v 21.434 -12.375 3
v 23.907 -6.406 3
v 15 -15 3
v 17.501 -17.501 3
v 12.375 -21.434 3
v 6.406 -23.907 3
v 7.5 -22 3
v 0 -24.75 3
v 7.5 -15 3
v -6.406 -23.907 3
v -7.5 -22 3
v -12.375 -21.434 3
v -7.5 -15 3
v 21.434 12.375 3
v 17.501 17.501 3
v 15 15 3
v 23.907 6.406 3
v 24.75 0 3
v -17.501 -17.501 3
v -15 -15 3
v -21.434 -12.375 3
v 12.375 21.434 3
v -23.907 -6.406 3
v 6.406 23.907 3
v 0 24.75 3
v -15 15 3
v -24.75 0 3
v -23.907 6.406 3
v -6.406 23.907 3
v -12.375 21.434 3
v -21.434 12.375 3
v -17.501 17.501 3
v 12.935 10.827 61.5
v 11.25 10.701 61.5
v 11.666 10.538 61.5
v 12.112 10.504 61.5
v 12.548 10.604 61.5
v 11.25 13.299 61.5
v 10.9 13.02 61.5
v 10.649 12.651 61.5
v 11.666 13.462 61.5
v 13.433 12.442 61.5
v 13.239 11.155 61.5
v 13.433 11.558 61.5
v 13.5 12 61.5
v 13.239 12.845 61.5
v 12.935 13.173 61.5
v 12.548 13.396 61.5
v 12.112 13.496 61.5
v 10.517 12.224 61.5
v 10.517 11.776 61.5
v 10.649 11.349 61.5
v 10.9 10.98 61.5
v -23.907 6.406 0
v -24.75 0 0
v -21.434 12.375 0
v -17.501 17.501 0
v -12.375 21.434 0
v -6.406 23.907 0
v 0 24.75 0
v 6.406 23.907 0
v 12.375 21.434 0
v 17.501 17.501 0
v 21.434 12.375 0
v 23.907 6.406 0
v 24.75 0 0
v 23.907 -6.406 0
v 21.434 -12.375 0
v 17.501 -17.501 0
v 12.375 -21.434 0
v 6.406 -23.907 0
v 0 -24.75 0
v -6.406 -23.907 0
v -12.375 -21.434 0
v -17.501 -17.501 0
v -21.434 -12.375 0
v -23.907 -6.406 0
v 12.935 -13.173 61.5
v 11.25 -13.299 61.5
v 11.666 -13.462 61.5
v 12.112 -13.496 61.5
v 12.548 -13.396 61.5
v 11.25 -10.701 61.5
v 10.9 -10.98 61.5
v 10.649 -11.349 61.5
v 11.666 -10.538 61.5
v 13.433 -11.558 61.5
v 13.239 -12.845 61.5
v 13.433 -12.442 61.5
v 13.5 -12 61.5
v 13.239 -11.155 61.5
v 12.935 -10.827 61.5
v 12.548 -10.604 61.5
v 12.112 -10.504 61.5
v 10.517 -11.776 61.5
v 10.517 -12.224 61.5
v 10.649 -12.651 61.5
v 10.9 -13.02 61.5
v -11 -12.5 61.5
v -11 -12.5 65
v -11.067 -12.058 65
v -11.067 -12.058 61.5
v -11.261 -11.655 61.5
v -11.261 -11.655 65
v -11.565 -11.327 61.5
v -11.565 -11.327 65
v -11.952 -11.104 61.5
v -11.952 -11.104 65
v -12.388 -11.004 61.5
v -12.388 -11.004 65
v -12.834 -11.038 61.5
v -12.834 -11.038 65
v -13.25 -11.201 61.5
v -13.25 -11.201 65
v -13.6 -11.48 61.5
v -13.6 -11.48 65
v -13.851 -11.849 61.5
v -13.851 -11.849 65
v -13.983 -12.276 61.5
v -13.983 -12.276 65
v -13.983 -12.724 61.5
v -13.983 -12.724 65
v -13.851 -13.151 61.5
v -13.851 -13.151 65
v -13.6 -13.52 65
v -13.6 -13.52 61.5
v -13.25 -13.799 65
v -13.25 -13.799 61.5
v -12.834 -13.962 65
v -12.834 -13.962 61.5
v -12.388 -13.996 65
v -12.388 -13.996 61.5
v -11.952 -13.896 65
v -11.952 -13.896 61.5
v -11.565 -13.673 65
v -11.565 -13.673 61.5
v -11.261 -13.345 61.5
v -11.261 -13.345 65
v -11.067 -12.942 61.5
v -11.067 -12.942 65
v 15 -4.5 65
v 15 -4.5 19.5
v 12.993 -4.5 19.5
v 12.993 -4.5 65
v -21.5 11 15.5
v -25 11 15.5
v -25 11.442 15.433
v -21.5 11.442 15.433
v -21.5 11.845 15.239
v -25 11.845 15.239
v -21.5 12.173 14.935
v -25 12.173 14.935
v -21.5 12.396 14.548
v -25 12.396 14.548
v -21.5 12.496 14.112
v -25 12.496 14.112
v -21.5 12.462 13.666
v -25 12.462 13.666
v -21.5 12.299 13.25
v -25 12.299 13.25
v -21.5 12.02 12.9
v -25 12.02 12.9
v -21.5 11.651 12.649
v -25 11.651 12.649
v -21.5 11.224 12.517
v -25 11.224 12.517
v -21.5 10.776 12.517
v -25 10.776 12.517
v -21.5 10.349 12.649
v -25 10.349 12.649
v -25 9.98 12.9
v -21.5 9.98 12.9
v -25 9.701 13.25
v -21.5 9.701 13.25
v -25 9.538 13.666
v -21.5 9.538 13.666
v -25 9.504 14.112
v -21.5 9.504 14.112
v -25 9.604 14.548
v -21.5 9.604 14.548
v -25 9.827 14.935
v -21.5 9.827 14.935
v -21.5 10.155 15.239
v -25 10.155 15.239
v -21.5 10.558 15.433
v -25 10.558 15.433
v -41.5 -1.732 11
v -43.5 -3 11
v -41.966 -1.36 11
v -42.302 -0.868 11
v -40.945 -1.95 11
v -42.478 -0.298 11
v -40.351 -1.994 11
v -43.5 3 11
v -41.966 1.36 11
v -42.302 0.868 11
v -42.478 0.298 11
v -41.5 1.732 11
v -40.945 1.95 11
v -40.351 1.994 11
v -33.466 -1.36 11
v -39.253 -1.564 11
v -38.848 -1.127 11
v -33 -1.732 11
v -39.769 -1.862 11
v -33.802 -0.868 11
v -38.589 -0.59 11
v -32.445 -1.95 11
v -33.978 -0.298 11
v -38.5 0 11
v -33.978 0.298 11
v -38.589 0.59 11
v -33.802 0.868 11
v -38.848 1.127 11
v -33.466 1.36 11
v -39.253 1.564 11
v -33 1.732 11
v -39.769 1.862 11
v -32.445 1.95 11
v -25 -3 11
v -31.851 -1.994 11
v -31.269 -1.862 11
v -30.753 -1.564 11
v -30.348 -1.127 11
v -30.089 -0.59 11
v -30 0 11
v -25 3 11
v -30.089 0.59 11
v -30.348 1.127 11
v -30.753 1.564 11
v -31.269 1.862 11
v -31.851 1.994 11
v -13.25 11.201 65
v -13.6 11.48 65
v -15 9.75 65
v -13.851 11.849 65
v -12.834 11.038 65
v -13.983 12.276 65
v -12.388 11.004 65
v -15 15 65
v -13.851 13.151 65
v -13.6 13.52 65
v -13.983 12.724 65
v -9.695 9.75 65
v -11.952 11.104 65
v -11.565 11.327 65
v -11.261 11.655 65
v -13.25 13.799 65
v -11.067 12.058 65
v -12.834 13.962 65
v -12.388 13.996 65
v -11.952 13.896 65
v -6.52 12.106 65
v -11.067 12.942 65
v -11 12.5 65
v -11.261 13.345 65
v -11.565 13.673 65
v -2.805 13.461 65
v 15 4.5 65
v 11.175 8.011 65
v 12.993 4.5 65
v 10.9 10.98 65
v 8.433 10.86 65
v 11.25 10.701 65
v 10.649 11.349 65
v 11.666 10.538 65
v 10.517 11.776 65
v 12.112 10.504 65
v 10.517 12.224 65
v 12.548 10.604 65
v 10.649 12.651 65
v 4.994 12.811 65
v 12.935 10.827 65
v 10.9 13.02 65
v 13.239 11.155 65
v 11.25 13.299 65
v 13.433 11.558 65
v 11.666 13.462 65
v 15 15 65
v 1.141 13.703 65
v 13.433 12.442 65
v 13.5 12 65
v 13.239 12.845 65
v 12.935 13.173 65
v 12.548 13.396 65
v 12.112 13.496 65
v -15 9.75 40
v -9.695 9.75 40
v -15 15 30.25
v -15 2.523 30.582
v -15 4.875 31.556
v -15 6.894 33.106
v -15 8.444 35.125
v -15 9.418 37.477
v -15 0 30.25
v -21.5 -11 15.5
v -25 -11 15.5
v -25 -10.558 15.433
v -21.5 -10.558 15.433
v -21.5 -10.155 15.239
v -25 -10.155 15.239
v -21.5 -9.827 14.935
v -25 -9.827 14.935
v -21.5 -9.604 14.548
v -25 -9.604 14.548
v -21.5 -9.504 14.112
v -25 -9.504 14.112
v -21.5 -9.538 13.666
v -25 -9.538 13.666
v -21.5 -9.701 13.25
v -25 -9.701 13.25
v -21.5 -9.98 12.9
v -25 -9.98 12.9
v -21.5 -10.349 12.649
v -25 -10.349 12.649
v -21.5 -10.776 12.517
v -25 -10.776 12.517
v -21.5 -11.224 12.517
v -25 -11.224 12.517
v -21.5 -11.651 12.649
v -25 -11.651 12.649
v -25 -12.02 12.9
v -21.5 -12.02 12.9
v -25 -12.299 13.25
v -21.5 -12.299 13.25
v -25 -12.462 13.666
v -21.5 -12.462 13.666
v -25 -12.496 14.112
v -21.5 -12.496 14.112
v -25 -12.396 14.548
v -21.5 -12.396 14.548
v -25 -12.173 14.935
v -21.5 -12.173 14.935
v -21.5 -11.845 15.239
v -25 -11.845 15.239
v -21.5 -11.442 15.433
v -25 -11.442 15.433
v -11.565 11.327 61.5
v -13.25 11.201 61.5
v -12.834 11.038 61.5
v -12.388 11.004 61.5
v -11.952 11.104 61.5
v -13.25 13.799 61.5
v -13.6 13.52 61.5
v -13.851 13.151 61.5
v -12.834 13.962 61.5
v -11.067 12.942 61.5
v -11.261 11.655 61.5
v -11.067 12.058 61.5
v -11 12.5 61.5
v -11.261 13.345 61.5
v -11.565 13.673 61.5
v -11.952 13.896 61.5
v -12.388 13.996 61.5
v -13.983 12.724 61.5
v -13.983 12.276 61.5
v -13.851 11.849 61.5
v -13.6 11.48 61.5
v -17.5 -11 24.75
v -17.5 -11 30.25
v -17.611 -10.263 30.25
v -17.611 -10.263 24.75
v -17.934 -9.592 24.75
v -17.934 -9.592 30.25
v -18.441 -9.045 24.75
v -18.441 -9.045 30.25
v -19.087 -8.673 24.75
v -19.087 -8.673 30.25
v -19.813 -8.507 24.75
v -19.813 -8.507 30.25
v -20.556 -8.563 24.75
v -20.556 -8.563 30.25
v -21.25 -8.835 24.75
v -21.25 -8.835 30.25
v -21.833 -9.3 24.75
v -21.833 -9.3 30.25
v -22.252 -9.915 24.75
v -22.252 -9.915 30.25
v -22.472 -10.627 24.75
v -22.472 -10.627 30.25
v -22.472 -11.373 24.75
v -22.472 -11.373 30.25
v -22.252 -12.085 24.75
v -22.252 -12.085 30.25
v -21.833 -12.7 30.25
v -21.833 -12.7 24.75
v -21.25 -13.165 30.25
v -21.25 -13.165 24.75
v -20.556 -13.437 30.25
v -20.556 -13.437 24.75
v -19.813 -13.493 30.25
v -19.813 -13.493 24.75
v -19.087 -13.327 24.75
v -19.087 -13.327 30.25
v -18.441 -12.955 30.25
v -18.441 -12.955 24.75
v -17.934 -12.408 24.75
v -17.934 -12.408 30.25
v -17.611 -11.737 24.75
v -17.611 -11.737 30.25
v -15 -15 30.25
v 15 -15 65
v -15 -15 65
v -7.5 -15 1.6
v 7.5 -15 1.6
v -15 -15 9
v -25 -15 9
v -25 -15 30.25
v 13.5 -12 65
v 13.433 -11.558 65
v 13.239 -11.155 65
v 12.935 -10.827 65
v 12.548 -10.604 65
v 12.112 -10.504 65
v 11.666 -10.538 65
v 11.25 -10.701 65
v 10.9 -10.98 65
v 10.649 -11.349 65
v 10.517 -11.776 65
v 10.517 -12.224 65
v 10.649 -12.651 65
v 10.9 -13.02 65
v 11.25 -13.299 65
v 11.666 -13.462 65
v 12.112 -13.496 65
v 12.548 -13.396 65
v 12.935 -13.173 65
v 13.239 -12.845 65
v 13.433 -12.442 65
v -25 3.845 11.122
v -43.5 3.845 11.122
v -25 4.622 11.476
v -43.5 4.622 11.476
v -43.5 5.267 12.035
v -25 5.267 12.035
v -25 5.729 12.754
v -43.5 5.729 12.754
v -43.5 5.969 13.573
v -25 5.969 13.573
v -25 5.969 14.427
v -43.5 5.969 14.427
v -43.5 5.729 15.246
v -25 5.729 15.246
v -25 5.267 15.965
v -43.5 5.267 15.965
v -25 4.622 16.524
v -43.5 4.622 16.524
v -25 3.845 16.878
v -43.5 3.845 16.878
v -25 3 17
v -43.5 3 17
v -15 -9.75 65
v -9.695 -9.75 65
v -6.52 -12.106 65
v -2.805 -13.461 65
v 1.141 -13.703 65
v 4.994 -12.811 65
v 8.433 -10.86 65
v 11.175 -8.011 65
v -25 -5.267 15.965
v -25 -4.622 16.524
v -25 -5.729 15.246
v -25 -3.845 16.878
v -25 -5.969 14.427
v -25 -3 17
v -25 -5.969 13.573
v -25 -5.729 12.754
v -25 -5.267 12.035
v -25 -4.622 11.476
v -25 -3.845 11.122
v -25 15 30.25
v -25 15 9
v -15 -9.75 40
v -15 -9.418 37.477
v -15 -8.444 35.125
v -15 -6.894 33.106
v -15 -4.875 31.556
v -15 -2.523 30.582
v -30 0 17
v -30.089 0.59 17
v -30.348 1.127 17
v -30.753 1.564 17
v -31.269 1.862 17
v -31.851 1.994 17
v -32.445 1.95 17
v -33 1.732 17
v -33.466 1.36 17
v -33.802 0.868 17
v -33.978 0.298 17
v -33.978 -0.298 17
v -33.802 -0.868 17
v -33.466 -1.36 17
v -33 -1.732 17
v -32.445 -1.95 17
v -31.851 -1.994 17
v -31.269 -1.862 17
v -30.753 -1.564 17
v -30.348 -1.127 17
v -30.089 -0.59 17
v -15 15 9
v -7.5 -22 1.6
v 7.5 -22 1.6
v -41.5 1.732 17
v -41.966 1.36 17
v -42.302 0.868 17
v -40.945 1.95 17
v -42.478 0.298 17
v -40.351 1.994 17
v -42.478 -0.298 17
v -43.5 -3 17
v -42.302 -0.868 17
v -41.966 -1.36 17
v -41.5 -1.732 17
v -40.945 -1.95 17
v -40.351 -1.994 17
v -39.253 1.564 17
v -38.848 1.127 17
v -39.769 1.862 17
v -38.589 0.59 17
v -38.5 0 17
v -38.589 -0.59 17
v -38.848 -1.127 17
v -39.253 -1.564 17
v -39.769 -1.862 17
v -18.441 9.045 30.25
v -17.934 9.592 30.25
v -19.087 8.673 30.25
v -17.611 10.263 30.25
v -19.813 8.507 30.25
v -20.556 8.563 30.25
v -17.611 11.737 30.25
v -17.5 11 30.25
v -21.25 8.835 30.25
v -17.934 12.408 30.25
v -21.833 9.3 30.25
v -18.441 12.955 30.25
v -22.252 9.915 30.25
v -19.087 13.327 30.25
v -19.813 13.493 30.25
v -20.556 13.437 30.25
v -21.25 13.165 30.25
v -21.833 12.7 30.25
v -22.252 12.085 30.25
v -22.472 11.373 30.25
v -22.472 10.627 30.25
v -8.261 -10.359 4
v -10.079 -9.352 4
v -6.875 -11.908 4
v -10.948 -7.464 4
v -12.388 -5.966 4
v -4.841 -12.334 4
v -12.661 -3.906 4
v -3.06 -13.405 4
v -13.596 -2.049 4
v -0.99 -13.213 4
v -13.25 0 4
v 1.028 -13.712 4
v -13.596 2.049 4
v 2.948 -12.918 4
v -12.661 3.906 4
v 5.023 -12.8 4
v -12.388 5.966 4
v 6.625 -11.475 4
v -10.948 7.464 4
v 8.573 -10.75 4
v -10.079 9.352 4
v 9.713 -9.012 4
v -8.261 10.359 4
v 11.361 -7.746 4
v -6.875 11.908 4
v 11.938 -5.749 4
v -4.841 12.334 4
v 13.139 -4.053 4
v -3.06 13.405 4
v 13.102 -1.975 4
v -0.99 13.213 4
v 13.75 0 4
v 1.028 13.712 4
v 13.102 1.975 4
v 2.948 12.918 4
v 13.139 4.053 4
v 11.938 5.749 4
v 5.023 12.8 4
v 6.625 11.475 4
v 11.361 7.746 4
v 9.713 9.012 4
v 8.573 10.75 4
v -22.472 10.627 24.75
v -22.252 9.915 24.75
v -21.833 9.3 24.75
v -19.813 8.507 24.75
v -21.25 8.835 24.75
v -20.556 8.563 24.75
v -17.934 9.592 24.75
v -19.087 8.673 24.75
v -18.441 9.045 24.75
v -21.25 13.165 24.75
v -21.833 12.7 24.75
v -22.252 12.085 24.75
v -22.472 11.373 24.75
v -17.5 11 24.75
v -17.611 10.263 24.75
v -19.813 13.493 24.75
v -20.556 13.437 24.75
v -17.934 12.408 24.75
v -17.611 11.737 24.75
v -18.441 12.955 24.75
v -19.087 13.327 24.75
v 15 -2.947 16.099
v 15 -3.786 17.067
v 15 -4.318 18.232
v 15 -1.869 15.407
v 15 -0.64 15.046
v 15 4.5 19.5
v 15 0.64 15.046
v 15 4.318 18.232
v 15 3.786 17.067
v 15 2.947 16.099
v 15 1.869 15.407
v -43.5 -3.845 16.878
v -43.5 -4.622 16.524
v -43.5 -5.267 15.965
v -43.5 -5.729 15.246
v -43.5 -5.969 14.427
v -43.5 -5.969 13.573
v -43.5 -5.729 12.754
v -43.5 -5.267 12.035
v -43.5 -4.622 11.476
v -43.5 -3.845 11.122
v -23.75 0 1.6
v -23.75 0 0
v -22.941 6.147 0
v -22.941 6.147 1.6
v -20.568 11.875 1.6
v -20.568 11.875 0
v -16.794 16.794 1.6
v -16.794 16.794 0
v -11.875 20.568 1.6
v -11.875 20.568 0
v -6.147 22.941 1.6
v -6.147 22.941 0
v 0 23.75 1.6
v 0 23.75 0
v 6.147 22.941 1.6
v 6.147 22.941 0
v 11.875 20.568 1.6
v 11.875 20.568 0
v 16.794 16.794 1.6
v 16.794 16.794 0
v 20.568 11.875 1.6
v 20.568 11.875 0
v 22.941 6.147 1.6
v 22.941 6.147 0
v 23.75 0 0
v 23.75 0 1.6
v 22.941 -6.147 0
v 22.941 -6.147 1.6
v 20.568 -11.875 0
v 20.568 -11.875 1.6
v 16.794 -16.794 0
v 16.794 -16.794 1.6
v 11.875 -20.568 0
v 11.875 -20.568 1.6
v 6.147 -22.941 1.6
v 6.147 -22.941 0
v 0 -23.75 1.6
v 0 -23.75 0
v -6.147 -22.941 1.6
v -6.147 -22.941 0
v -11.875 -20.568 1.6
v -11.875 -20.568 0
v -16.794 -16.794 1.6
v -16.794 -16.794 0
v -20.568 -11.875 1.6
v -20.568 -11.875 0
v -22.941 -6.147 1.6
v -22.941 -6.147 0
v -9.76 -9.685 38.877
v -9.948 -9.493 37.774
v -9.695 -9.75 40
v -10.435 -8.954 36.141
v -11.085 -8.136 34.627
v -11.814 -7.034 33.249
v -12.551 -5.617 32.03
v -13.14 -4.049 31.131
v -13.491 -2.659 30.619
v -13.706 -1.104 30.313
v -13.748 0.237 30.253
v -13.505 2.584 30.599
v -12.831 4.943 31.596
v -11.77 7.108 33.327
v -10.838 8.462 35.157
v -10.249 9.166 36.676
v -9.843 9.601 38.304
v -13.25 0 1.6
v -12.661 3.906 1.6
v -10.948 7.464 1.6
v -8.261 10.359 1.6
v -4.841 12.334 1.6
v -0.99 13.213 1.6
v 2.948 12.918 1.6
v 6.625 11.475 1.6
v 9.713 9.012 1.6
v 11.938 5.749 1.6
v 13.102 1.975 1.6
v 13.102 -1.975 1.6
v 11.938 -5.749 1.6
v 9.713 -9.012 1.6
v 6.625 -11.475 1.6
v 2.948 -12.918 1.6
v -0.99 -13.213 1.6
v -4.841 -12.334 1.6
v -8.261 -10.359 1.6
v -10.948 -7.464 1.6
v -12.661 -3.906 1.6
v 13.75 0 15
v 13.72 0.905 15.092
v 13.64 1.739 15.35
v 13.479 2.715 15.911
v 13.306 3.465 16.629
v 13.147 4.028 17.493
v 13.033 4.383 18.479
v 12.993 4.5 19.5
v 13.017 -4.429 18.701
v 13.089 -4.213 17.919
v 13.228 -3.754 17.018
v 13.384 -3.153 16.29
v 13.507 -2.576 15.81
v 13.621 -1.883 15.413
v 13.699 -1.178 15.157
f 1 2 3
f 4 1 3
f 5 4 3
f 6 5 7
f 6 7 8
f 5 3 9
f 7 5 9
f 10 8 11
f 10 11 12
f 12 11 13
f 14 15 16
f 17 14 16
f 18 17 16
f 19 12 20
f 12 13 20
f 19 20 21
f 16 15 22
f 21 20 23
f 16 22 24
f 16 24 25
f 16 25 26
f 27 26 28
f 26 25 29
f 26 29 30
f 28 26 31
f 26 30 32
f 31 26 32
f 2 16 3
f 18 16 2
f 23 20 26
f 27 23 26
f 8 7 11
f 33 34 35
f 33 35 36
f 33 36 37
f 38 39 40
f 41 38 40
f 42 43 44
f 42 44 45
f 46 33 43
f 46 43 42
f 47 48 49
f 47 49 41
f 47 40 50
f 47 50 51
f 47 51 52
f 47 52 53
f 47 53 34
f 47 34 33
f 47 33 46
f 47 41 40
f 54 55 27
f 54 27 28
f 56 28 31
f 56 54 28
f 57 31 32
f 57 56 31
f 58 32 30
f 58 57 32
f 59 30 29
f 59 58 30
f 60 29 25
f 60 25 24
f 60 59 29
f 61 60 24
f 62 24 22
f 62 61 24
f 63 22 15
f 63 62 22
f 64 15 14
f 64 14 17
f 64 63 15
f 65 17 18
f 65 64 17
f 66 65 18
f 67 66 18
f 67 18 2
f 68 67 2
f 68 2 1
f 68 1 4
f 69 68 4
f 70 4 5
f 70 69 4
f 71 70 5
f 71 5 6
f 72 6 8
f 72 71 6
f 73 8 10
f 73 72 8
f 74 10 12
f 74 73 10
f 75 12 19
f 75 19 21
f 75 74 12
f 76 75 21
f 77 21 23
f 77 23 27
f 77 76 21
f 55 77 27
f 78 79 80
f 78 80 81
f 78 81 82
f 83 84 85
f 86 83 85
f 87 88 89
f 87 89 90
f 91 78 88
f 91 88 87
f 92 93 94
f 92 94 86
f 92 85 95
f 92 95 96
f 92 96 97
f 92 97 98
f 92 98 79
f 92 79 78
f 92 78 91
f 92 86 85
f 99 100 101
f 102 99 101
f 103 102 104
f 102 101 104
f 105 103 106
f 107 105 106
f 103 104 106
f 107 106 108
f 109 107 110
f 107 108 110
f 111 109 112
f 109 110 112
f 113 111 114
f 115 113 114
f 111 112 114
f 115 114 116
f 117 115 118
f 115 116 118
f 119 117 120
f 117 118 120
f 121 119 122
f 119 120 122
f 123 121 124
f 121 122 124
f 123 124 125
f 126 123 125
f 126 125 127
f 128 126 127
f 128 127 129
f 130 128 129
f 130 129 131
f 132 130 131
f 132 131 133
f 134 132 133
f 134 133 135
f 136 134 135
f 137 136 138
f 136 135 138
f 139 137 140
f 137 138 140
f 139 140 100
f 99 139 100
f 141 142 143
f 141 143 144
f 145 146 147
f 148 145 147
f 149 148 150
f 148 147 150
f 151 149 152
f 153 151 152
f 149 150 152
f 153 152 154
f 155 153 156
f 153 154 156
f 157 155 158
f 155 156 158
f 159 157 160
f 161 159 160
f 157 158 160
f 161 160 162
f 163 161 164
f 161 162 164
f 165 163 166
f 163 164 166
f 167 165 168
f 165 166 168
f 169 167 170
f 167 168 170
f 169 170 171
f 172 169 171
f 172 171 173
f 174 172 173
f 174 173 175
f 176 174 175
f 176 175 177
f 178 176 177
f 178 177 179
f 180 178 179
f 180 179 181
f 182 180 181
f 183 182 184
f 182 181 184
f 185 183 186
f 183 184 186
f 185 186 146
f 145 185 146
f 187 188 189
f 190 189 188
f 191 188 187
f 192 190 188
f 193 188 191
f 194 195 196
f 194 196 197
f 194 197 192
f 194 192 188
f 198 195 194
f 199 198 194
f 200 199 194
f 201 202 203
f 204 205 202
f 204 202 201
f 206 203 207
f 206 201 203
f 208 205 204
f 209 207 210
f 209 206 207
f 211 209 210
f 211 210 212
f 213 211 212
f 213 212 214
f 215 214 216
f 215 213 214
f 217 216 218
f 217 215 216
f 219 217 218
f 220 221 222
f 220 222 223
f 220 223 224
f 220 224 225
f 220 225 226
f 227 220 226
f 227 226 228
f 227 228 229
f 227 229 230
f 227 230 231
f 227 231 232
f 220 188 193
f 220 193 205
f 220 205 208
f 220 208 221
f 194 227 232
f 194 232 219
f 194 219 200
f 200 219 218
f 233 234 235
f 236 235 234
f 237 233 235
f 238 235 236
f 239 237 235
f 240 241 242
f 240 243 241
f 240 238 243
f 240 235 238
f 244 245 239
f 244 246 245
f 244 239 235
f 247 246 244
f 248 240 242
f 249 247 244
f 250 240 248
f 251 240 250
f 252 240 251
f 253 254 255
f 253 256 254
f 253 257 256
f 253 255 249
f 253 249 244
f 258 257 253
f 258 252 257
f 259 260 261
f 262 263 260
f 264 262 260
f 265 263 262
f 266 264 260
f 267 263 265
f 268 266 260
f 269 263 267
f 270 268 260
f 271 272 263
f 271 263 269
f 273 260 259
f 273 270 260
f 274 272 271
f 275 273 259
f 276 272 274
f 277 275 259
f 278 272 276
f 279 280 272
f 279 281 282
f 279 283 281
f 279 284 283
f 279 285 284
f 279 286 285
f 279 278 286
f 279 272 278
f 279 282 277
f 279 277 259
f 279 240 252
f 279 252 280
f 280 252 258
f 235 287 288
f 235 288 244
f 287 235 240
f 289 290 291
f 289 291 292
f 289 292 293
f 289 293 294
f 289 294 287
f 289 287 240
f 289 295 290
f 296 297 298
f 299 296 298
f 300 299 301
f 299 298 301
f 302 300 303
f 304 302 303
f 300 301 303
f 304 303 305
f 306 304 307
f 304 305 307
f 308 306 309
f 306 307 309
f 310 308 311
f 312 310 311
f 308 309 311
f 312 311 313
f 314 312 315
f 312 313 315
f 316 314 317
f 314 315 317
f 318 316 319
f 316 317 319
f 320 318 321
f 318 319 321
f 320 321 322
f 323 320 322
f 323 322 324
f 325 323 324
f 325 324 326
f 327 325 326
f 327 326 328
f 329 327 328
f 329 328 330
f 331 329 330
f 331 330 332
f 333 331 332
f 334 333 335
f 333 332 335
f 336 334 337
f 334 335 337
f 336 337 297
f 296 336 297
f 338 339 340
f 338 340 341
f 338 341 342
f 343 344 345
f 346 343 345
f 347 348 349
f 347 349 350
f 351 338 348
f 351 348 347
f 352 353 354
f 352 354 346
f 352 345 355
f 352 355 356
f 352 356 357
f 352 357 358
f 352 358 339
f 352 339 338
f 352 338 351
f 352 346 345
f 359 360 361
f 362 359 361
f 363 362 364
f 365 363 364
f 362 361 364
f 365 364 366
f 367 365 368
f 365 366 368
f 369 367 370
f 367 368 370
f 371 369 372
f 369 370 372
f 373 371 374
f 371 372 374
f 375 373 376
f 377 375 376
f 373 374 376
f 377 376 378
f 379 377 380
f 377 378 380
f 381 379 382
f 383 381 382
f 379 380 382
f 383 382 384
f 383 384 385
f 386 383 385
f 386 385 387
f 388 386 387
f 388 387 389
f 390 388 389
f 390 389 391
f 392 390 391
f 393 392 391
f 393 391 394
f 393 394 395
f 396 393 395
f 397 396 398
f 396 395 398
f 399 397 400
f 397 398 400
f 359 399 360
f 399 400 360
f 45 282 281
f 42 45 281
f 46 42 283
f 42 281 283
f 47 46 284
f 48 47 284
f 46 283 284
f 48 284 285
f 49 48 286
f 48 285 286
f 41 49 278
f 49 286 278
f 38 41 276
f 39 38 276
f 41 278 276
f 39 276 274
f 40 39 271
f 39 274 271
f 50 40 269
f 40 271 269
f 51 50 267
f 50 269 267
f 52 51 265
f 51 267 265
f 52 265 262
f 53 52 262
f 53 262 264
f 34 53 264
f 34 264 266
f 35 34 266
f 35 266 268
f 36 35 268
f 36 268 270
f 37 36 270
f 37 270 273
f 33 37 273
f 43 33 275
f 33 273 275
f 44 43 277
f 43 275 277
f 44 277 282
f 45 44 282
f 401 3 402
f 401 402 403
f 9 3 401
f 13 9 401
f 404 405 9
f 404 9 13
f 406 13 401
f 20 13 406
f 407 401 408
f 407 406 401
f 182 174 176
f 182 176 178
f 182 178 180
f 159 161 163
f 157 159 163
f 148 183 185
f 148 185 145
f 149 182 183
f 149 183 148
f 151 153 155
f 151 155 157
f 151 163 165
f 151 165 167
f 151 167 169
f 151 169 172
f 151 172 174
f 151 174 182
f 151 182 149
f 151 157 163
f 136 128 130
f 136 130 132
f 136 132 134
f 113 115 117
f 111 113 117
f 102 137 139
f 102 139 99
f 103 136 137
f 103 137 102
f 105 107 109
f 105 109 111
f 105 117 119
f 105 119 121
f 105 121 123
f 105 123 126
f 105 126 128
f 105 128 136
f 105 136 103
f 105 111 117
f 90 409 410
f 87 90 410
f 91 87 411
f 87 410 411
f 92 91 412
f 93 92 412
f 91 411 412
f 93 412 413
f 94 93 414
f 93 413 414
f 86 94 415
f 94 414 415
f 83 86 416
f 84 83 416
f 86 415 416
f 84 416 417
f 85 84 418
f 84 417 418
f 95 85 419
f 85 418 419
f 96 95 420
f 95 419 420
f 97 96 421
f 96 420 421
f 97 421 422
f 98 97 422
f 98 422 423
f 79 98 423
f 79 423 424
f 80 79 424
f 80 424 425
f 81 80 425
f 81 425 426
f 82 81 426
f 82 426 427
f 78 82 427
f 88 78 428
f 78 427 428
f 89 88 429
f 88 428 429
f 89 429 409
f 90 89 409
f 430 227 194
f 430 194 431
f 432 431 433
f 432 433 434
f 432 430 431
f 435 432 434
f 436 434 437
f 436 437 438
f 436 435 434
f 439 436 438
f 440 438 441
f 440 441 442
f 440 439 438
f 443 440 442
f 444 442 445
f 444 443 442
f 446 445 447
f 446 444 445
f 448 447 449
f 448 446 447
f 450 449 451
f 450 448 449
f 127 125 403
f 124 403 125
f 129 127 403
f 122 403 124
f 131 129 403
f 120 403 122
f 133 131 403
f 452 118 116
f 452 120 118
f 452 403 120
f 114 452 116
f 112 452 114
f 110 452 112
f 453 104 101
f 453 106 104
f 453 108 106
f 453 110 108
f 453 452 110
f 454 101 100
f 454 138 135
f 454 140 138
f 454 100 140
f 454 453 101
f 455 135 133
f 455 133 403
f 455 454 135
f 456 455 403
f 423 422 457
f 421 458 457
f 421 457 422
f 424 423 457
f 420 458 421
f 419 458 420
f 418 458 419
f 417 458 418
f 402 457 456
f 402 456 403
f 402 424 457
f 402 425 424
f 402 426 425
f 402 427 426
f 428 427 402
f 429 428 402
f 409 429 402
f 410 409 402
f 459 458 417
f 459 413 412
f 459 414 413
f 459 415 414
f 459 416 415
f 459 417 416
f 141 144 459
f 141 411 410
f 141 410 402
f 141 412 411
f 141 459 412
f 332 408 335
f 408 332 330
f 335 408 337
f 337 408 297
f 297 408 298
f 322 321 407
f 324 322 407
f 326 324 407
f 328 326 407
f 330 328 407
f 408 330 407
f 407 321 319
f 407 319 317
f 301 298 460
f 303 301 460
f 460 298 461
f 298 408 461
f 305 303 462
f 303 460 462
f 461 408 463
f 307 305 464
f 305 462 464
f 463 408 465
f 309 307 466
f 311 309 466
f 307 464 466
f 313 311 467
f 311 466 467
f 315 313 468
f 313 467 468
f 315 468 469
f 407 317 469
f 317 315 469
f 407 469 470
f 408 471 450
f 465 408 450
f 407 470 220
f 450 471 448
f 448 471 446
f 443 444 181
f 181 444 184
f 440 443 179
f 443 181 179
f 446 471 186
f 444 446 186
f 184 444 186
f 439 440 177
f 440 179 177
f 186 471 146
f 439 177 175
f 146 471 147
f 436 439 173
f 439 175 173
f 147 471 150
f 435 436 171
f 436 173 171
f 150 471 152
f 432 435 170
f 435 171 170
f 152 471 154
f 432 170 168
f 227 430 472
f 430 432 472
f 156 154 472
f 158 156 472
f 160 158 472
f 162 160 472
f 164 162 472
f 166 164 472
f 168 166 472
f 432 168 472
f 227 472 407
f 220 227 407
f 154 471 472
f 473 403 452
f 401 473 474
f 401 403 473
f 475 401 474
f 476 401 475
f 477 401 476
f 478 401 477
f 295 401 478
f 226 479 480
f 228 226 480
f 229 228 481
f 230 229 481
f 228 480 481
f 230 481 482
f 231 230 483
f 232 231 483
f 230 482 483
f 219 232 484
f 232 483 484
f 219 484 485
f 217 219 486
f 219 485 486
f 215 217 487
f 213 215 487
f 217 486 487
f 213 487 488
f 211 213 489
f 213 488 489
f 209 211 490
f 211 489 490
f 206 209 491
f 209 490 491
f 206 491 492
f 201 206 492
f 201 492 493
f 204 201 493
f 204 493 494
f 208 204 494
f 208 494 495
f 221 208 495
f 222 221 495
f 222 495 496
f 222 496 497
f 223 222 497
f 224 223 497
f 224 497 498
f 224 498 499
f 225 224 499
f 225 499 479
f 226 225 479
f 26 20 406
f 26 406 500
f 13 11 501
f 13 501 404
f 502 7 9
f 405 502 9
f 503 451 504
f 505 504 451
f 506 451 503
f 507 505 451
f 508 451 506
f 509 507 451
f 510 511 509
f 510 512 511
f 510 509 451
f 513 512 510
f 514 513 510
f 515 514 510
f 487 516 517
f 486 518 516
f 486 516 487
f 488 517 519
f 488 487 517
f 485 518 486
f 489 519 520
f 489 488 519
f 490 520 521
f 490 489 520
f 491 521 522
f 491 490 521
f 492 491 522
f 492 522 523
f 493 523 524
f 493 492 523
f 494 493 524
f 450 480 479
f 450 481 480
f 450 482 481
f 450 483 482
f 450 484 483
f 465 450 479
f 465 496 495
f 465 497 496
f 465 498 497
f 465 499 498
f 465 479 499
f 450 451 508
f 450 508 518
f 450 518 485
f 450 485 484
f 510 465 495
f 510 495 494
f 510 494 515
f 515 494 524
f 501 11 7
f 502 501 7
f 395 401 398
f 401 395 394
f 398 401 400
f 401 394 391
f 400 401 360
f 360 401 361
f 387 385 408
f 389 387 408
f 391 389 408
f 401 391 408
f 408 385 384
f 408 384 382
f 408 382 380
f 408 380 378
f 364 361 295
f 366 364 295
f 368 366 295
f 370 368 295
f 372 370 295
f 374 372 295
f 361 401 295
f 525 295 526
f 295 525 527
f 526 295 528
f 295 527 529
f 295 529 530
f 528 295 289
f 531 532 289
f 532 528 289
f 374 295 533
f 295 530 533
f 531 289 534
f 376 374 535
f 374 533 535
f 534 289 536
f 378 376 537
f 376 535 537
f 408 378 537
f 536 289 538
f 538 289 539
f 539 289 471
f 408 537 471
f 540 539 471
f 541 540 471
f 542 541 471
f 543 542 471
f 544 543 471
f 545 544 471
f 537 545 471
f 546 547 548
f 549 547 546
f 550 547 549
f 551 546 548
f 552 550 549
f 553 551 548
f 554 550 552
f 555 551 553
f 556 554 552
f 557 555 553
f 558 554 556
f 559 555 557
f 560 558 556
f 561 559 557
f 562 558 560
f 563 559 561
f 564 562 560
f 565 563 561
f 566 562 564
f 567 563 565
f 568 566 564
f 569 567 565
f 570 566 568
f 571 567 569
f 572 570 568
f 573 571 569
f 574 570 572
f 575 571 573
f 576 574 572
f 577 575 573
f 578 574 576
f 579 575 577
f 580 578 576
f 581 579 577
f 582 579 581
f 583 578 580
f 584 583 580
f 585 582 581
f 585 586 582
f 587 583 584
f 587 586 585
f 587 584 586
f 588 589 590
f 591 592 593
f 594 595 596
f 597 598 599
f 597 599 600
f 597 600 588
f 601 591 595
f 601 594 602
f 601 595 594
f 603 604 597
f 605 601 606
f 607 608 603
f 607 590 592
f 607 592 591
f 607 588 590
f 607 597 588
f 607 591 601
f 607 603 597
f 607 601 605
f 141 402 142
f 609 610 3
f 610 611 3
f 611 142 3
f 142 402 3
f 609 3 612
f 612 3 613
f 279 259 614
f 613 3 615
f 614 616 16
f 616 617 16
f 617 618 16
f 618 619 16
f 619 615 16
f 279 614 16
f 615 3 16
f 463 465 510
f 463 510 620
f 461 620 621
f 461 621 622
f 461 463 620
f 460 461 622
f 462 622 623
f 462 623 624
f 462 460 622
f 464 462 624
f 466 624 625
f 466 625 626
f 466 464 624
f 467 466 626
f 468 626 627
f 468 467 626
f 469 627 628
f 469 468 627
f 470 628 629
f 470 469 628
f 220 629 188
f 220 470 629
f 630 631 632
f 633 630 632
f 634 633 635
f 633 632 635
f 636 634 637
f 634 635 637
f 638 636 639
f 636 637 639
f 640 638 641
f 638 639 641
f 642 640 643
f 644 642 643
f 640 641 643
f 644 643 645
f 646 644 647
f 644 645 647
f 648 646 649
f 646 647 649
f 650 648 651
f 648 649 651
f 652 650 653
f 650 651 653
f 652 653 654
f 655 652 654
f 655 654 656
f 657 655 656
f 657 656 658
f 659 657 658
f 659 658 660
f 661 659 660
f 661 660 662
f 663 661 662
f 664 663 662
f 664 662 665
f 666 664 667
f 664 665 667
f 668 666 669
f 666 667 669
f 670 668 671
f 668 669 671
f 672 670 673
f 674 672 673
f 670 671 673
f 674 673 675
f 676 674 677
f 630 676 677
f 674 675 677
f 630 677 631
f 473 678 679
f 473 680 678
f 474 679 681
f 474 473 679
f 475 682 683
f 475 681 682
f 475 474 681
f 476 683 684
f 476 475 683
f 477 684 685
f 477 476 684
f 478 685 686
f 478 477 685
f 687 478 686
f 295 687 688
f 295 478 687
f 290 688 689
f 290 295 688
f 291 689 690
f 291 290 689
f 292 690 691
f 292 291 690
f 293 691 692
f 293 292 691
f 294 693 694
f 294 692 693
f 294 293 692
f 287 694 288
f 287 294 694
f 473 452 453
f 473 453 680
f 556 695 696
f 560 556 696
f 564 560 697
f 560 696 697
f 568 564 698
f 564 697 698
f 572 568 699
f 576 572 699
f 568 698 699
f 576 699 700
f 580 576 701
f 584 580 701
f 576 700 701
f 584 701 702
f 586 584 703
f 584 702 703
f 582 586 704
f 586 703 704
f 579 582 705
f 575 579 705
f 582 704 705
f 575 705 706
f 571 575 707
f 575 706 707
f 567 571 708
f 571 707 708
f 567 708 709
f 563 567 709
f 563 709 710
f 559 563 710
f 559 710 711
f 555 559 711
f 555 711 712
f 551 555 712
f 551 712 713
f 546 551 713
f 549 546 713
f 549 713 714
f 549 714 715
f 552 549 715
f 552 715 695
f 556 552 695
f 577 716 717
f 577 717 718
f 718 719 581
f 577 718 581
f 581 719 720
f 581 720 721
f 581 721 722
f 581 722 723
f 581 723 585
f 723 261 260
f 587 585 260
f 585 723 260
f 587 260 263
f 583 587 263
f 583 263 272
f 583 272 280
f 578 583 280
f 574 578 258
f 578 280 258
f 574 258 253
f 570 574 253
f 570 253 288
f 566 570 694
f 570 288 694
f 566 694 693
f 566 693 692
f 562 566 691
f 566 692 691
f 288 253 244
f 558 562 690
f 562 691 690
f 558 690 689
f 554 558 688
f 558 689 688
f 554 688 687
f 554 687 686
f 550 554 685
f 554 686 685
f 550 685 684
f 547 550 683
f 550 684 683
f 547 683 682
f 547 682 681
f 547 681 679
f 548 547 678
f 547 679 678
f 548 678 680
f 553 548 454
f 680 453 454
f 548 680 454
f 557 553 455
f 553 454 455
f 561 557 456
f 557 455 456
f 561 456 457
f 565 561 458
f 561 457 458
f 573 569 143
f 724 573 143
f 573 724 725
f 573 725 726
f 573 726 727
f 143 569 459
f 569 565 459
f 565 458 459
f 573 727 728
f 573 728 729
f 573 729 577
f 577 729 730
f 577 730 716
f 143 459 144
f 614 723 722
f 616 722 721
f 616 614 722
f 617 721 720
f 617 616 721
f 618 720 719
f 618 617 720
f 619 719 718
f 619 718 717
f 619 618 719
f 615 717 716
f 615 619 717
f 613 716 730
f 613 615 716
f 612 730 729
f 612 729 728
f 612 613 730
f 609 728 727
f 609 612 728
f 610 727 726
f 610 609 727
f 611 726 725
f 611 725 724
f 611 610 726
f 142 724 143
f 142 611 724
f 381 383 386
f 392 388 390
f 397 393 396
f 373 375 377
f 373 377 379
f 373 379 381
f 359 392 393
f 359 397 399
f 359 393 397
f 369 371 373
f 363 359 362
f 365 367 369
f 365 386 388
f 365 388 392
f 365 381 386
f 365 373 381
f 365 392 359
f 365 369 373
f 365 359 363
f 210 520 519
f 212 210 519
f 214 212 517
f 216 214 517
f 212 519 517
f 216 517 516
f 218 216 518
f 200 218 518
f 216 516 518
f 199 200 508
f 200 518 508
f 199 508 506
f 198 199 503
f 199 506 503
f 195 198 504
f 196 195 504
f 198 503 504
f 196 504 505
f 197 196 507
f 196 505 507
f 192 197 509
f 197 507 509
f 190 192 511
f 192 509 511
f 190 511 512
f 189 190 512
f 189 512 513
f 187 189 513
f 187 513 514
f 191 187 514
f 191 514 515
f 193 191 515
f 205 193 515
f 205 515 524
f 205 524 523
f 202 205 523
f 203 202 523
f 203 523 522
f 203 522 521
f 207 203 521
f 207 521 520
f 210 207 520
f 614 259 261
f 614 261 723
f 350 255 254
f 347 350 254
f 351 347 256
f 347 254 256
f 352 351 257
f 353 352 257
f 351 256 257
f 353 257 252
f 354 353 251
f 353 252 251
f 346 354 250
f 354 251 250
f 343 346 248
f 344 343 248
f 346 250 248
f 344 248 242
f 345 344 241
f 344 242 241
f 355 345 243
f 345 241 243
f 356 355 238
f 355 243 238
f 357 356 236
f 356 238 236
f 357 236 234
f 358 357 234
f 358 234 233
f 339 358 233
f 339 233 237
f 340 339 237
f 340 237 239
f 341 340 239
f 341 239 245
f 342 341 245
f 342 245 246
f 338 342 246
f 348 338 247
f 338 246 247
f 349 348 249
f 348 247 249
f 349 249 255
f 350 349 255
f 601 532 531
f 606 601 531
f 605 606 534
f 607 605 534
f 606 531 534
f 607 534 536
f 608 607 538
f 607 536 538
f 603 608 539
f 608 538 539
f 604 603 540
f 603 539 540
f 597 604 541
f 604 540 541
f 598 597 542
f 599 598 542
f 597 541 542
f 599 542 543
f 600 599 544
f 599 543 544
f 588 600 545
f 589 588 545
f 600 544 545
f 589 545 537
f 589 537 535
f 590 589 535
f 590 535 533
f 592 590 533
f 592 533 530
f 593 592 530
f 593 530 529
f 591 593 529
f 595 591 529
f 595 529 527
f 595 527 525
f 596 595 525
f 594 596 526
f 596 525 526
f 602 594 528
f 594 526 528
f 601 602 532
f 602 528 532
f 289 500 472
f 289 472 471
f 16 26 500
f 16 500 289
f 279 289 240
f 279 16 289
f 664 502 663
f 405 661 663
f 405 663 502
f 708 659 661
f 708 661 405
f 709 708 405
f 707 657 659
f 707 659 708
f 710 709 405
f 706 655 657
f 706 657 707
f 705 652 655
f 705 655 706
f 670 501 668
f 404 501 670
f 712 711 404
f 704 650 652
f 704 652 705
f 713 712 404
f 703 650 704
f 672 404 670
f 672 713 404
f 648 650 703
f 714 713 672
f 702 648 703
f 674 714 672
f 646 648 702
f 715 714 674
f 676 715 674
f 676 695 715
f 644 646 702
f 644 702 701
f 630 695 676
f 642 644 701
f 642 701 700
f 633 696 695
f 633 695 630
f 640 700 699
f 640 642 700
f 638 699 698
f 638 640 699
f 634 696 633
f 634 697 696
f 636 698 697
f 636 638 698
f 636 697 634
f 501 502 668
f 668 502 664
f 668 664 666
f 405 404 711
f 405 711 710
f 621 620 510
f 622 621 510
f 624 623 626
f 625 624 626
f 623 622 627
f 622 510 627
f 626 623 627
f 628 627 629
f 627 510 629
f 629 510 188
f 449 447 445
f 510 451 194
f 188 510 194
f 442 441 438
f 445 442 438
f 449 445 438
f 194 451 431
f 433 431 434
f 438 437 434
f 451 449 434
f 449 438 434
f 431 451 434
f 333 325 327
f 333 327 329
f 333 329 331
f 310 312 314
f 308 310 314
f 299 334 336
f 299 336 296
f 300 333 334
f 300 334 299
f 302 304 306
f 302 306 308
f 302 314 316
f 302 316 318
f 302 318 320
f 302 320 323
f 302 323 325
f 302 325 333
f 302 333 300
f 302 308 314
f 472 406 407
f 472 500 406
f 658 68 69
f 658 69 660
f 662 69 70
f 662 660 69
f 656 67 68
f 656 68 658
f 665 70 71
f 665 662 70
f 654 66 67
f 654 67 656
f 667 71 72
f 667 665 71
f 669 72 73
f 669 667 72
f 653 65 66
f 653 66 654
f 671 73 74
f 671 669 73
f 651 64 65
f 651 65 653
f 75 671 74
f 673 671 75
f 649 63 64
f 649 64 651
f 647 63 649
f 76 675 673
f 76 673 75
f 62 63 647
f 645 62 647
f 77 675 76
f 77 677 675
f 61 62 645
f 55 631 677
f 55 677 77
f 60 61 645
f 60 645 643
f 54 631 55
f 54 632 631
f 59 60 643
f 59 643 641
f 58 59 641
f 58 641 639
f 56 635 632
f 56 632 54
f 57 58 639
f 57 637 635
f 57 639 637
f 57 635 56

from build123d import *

# Parameters (mm, degrees)
SKETCH1_W                = 30
SKETCH1_H                = 30
BOSS_EXTRUDE1_DEPTH      = 65
SKETCH2_R                = 24.75
BOSS_EXTRUDE2_DEPTH      = 3
SKETCH3_R                = 23.75
CUT_EXTRUDE1_DEPTH       = 1.6
CUT_EXTRUDE4_REACH       = 74.42
SKETCH4_R                = 13.25
SKETCH5_R                = 13.75
CUT_EXTRUDE5_DEPTH       = 61
CUT_EXTRUDE9_REACH       = 82.11
CUT_EXTRUDE9_END_RADIUS  = 13.75
SKETCH8_W                = 10
SKETCH8_H                = 20
BOSS_EXTRUDE3_DEPTH      = 10
BOSS_EXTRUDE4_DEPTH      = 18.5
CUT_EXTRUDE10_REACH      = 71.346
SKETCH10_R               = 2
CUT_EXTRUDE11_REACH      = 82.11
CUT_EXTRUDE11_END_RADIUS = 13.75
CUT_EXTRUDE12_REACH      = 81.679
SKETCH13_W               = 15
SKETCH13_H               = 7
SKETCH14_W               = 11.25
SKETCH14_H               = 20
BOSS_EXTRUDE5_DEPTH      = 10
SKETCH15_W               = 21.25
SKETCH15_H               = 5
BOSS_EXTRUDE6_DEPTH      = 10
SKETCH16_W               = 10
SKETCH16_H               = 21.25
BOSS_EXTRUDE7_DEPTH      = 5
SKETCH18_R               = 2.5
CUT_EXTRUDE13_DEPTH      = 5.5
SKETCH19_R               = 1.5
CUT_EXTRUDE14_DEPTH      = 3.5
SKETCH20_R               = 1.5
CUT_EXTRUDE15_DEPTH      = 3.5


with BuildPart() as part:
    # Sketch1 → Boss-Extrude1 (new body)
    with BuildSketch(Plane.XY):
        Rectangle(SKETCH1_W, SKETCH1_H)
    extrude(amount=BOSS_EXTRUDE1_DEPTH)

    # Sketch2 → Boss-Extrude2 (add)
    with BuildSketch(Plane(origin=(0, 0, 0), x_dir=(-1, 0, 0), z_dir=(0, 0, -1))):
        Circle(SKETCH2_R)
    extrude(amount=-BOSS_EXTRUDE2_DEPTH)

    # Sketch3 → Cut-Extrude1 (cut)
    with BuildSketch(Plane(origin=(0, 0, 0), x_dir=(-1, 0, 0), z_dir=(0, 0, -1))):
        Circle(SKETCH3_R)
    extrude(amount=-CUT_EXTRUDE1_DEPTH, mode=Mode.SUBTRACT)

    # Sketch4 → Cut-Extrude4 (cut, up to next)
    with BuildSketch(Plane(origin=(0, 0, 1.6), x_dir=(-1, 0, 0), z_dir=(0, 0, -1)), mode=Mode.PRIVATE) as cut_extrude4_sk1:
        Circle(SKETCH4_R)
    cut_extrude4_tool1 = extrude(cut_extrude4_sk1.sketch, amount=-CUT_EXTRUDE4_REACH, mode=Mode.PRIVATE) & part.part
    add(cut_extrude4_tool1.solids().sort_by_distance((0, 0, 1.6))[0], mode=Mode.SUBTRACT)

    # Sketch5 → Cut-Extrude5 (cut)
    with BuildSketch(Plane.XY.offset(65)):
        Circle(SKETCH5_R)
    extrude(amount=-CUT_EXTRUDE5_DEPTH, mode=Mode.SUBTRACT)

    # Cut-Extrude9: up to this cylinder (the profile starts outside it)
    cut_extrude9_end = Plane(origin=(0, 0, 42.25), z_dir=(0, 0, 1)) * Cylinder(CUT_EXTRUDE9_END_RADIUS, 192.72, mode=Mode.PRIVATE)
    # Sketch6 → Cut-Extrude9 (cut, up to the surface)
    with BuildSketch(Plane(origin=(15, 0, 0), x_dir=(0, 0, -1), z_dir=(1, 0, 0)), mode=Mode.PRIVATE) as cut_extrude9_sk1:
        with BuildLine():
            Line((-19.5, -4.5), (-65, -4.5))
            ThreePointArc((-65, -4.5), (-69.5, 0), (-65, 4.5))
            Line((-65, 4.5), (-19.5, 4.5))
            ThreePointArc((-19.5, 4.5), (-15, 0), (-19.5, -4.5))
        make_face()
    cut_extrude9_tool1 = extrude(cut_extrude9_sk1.sketch, amount=-CUT_EXTRUDE9_REACH, mode=Mode.PRIVATE) - cut_extrude9_end
    add(cut_extrude9_tool1.solids().sort_by_distance((15, 0, 42.25))[0], mode=Mode.SUBTRACT)

    # Sketch8 → Boss-Extrude3 (add)
    with BuildSketch(Plane.ZY.offset(15)):
        with Locations((14, 0)):
            Rectangle(SKETCH8_W, SKETCH8_H)
    extrude(amount=BOSS_EXTRUDE3_DEPTH)

    # Sketch9 → Boss-Extrude4 (add)
    with BuildSketch(Plane.ZY.offset(25)):
        with BuildLine():
            Line((17, 3), (17, -3))
            ThreePointArc((17, -3), (14, -6), (11, -3))
            Line((11, -3), (11, 3))
            ThreePointArc((11, 3), (14, 6), (17, 3))
        make_face()
    extrude(amount=BOSS_EXTRUDE4_DEPTH)

    # Sketch10 → Cut-Extrude10 (cut, up to next)
    with BuildSketch(Plane.XY.offset(17), mode=Mode.PRIVATE) as cut_extrude10_sk1:
        with Locations((-40.5, 0)):
            Circle(SKETCH10_R)
    cut_extrude10_tool1 = extrude(cut_extrude10_sk1.sketch, amount=-CUT_EXTRUDE10_REACH, mode=Mode.PRIVATE) & part.part
    # Sketch10 → Cut-Extrude10 (cut, up to next)
    with BuildSketch(Plane.XY.offset(17), mode=Mode.PRIVATE) as cut_extrude10_sk2:
        with Locations((-32, 0)):
            Circle(SKETCH10_R)
    cut_extrude10_tool2 = extrude(cut_extrude10_sk2.sketch, amount=-CUT_EXTRUDE10_REACH, mode=Mode.PRIVATE) & part.part
    add(cut_extrude10_tool1.solids().sort_by_distance((-40.5, 0, 17))[0], mode=Mode.SUBTRACT)
    add(cut_extrude10_tool2.solids().sort_by_distance((-32, 0, 17))[0], mode=Mode.SUBTRACT)

    # Cut-Extrude11: up to this cylinder (the profile starts outside it)
    cut_extrude11_end = Plane(origin=(0, 0, 52.5), z_dir=(0, 0, 1)) * Cylinder(CUT_EXTRUDE11_END_RADIUS, 192.72, mode=Mode.PRIVATE)
    # Sketch11 → Cut-Extrude11 (cut, up to the surface)
    with BuildSketch(Plane.ZY.offset(15), mode=Mode.PRIVATE) as cut_extrude11_sk1:
        with BuildLine():
            Line((40, 9.75), (65, 9.75))
            ThreePointArc((65, 9.75), (74.75, 0), (65, -9.75))
            Line((65, -9.75), (40, -9.75))
            ThreePointArc((40, -9.75), (30.25, 0), (40, 9.75))
        make_face()
    cut_extrude11_tool1 = extrude(cut_extrude11_sk1.sketch, amount=-CUT_EXTRUDE11_REACH, mode=Mode.PRIVATE) - cut_extrude11_end
    add(cut_extrude11_tool1.solids().sort_by_distance((-15, 0, 52.5))[0], mode=Mode.SUBTRACT)

    # Sketch13 → Cut-Extrude12 (cut, up to next)
    with BuildSketch(Plane.XY.offset(3), mode=Mode.PRIVATE) as cut_extrude12_sk1:
        with Locations((0, -18.5)):
            Rectangle(SKETCH13_W, SKETCH13_H)
    cut_extrude12_tool1 = extrude(cut_extrude12_sk1.sketch, amount=-CUT_EXTRUDE12_REACH, mode=Mode.PRIVATE) & part.part
    add(cut_extrude12_tool1.solids().sort_by_distance((0, -18.5, 3))[0], mode=Mode.SUBTRACT)

    # Sketch14 → Boss-Extrude5 (add)
    with BuildSketch(Plane.ZY.offset(15)):
        with Locations((24.625, 0)):
            Rectangle(SKETCH14_W, SKETCH14_H)
    extrude(amount=BOSS_EXTRUDE5_DEPTH)

    # Sketch15 → Boss-Extrude6 (add)
    with BuildSketch(Plane.ZY.offset(15)):
        with Locations((19.625, 12.5)):
            Rectangle(SKETCH15_W, SKETCH15_H)
    extrude(amount=BOSS_EXTRUDE6_DEPTH)

    # Sketch16 → Boss-Extrude7 (add)
    with BuildSketch(Plane(origin=(0, -10, 0), x_dir=(-1, 0, 0), z_dir=(0, -1, 0))):
        with Locations((20, -19.625)):
            Rectangle(SKETCH16_W, SKETCH16_H)
    extrude(amount=BOSS_EXTRUDE7_DEPTH)

    # Sketch18 → Cut-Extrude13 (cut)
    with BuildSketch(Plane.XY.offset(30.25)):
        with Locations((-20, -11)):
            Circle(SKETCH18_R)
        with Locations((-20, 11)):
            Circle(SKETCH18_R)
    extrude(amount=-CUT_EXTRUDE13_DEPTH, mode=Mode.SUBTRACT)

    # Sketch19 → Cut-Extrude14 (cut)
    with BuildSketch(Plane.XY.offset(65)):
        with Locations((12, -12)):
            Circle(SKETCH19_R)
        with Locations((12, 12)):
            Circle(SKETCH19_R)
        with Locations((-12.5, -12.5)):
            Circle(SKETCH19_R)
        with Locations((-12.5, 12.5)):
            Circle(SKETCH19_R)
    extrude(amount=-CUT_EXTRUDE14_DEPTH, mode=Mode.SUBTRACT)

    # Sketch20 → Cut-Extrude15 (cut)
    with BuildSketch(Plane.ZY.offset(25)):
        with Locations((14, 11)):
            Circle(SKETCH20_R)
        with Locations((14, -11)):
            Circle(SKETCH20_R)
    extrude(amount=-CUT_EXTRUDE15_DEPTH, mode=Mode.SUBTRACT)


solid = part.part
